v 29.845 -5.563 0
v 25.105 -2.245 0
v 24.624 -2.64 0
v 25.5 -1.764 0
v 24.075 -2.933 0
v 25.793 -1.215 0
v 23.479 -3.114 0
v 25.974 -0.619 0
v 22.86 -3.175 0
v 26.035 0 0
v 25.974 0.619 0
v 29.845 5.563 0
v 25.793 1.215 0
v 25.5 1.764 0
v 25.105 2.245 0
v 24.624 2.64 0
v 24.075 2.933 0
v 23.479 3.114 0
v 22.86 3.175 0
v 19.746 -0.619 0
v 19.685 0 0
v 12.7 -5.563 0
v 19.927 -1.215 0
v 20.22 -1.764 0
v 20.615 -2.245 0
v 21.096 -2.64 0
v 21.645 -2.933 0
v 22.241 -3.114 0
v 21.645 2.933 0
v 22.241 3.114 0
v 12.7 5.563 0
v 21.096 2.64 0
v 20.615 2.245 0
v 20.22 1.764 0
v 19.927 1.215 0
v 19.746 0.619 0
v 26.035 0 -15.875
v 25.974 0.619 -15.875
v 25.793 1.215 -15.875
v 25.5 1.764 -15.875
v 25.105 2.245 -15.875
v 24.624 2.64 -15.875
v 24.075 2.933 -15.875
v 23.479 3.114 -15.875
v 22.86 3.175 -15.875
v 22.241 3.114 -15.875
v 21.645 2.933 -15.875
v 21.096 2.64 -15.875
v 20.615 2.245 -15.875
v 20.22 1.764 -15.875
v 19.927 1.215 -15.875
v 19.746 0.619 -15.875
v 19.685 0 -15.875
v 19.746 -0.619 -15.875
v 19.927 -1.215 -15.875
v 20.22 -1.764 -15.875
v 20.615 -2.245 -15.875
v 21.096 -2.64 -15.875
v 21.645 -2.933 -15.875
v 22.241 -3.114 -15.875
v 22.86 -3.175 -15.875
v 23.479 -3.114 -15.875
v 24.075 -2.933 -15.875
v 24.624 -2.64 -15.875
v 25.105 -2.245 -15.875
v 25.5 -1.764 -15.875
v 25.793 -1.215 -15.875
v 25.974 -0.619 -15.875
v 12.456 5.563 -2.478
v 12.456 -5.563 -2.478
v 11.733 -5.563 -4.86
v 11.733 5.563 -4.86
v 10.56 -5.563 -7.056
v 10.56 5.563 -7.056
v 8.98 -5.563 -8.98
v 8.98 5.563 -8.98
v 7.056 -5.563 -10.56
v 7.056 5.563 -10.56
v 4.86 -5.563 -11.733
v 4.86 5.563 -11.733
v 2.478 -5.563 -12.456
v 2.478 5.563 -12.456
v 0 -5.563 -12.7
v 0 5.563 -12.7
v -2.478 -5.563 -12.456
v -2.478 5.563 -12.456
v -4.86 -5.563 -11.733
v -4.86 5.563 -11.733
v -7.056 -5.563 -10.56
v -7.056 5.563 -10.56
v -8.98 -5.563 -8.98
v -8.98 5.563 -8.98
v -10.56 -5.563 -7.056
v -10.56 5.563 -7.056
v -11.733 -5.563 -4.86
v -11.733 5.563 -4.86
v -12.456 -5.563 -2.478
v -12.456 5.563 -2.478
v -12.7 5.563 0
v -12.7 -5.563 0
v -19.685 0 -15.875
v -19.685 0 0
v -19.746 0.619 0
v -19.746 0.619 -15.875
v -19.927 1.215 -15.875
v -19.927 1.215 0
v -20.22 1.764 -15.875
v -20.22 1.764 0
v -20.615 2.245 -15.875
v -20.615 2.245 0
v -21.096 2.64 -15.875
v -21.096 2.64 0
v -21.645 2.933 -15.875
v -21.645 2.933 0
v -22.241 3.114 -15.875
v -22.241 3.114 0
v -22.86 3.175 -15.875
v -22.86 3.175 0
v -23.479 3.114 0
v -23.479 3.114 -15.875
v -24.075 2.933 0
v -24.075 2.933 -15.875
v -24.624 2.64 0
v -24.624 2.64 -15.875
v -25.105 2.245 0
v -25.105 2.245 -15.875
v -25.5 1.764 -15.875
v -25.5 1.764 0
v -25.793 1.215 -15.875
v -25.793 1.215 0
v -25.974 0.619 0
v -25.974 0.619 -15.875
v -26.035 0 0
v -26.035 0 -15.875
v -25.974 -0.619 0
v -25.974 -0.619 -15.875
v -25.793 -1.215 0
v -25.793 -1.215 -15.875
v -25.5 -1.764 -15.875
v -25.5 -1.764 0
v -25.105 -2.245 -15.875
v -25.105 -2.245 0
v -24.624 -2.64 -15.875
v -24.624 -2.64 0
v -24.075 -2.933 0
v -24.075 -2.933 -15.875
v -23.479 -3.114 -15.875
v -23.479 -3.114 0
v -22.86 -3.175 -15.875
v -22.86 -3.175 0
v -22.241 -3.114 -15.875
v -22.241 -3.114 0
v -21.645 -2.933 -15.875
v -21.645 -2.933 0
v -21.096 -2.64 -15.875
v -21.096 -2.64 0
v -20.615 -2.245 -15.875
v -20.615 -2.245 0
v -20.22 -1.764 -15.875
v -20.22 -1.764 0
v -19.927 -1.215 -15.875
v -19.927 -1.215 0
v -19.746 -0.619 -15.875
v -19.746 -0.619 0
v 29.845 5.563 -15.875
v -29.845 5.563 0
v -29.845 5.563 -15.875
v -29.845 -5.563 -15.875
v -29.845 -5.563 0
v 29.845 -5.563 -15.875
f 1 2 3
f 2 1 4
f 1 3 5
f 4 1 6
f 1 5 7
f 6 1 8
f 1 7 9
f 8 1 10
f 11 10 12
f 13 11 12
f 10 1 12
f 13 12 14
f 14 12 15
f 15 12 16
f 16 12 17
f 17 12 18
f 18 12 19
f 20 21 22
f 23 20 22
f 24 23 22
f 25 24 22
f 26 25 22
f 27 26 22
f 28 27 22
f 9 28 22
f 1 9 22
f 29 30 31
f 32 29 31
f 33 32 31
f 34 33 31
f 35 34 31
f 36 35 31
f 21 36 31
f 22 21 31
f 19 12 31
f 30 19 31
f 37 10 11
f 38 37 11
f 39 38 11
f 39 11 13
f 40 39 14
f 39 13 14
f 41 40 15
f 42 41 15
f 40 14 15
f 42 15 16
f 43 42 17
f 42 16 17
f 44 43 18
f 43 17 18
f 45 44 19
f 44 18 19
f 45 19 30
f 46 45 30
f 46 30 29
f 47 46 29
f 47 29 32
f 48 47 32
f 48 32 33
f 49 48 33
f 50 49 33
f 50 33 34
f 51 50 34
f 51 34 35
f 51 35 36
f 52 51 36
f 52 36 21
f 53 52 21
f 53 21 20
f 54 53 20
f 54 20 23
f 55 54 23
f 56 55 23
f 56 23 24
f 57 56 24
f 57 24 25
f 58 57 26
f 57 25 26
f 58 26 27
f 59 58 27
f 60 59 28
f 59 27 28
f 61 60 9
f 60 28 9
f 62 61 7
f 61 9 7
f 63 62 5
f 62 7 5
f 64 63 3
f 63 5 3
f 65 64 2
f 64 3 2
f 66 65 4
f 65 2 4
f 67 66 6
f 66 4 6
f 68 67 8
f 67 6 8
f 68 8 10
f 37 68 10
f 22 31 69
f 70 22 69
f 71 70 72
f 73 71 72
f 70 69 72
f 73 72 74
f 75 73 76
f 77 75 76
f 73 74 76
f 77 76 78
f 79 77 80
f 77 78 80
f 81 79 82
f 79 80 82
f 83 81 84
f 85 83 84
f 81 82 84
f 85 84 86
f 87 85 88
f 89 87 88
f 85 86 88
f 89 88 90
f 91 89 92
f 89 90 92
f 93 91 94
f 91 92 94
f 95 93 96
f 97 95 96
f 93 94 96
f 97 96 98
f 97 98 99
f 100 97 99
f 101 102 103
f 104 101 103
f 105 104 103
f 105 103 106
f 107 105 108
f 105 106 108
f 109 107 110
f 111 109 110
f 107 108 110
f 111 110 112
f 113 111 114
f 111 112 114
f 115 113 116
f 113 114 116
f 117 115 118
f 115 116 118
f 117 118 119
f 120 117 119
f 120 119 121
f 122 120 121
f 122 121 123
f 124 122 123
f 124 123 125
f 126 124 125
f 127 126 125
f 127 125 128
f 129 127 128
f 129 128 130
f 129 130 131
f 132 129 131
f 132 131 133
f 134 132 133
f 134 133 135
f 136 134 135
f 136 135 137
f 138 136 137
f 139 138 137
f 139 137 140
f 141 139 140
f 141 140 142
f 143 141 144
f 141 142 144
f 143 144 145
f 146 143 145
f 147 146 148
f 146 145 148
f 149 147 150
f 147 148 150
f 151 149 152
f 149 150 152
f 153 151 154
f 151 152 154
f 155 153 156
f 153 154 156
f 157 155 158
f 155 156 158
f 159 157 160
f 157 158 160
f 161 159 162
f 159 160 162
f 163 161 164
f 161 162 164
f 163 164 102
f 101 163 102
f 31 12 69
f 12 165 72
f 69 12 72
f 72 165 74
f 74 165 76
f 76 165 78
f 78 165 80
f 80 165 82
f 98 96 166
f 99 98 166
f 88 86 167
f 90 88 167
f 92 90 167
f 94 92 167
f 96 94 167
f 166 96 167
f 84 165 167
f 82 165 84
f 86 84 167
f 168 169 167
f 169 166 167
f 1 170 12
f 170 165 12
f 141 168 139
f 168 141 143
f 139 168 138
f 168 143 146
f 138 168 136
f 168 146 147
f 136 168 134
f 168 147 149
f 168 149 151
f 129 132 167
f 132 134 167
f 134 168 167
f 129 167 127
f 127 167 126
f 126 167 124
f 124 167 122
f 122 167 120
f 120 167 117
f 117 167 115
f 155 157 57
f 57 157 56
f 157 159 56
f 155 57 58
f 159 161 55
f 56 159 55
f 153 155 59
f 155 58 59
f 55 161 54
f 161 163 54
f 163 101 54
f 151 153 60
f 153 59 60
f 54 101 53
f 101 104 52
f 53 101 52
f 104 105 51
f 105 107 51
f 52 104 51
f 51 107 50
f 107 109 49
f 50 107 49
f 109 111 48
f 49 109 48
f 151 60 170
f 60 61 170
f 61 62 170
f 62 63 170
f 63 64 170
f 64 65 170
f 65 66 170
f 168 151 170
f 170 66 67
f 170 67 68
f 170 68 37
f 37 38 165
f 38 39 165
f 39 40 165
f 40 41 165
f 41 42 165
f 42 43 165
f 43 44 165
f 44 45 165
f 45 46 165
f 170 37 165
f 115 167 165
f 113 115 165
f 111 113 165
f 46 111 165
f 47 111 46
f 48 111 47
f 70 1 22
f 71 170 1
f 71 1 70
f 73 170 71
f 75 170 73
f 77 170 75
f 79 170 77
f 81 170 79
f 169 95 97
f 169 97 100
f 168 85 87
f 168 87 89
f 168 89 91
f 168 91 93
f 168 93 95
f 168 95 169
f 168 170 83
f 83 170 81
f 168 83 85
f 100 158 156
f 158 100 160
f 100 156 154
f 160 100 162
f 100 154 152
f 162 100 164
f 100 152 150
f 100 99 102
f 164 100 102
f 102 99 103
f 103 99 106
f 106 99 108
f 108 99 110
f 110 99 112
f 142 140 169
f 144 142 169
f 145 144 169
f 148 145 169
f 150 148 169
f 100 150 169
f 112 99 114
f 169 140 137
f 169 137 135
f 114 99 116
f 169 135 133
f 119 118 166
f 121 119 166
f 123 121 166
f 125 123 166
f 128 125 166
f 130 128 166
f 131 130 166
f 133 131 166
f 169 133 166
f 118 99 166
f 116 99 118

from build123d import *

# Parameters (mm, degrees)
BOSS_EXTRUDE1_DEPTH = 5.5626
SKETCH2_R           = 3.175
CUT_EXTRUDE1_DEPTH  = 16.875


with BuildPart() as part:
    # Sketch1 → Boss-Extrude1 (new body, symmetric)
    with BuildSketch(Plane(origin=(0, 0, 0), x_dir=(1, 0, 0), z_dir=(0, 1, 0))):
        with BuildLine():
            Line((-12.7, 0), (-29.845, 0))
            Line((-29.845, 0), (-29.845, 15.875))
            Line((-29.845, 15.875), (29.845, 15.875))
            Line((29.845, 15.875), (29.845, 0))
            Line((29.845, 0), (12.7, 0))
            ThreePointArc((12.7, 0), (0, 12.7), (-12.7, 0))
        make_face()
    extrude(amount=BOSS_EXTRUDE1_DEPTH, both=True)

    # Sketch2 → Cut-Extrude1 (cut, through all)
    with BuildSketch(Plane.XY):
        with Locations((-22.86, 0)):
            Circle(SKETCH2_R)
        with Locations((22.86, 0)):
            Circle(SKETCH2_R)
    extrude(amount=-CUT_EXTRUDE1_DEPTH, mode=Mode.SUBTRACT)


solid = part.part
